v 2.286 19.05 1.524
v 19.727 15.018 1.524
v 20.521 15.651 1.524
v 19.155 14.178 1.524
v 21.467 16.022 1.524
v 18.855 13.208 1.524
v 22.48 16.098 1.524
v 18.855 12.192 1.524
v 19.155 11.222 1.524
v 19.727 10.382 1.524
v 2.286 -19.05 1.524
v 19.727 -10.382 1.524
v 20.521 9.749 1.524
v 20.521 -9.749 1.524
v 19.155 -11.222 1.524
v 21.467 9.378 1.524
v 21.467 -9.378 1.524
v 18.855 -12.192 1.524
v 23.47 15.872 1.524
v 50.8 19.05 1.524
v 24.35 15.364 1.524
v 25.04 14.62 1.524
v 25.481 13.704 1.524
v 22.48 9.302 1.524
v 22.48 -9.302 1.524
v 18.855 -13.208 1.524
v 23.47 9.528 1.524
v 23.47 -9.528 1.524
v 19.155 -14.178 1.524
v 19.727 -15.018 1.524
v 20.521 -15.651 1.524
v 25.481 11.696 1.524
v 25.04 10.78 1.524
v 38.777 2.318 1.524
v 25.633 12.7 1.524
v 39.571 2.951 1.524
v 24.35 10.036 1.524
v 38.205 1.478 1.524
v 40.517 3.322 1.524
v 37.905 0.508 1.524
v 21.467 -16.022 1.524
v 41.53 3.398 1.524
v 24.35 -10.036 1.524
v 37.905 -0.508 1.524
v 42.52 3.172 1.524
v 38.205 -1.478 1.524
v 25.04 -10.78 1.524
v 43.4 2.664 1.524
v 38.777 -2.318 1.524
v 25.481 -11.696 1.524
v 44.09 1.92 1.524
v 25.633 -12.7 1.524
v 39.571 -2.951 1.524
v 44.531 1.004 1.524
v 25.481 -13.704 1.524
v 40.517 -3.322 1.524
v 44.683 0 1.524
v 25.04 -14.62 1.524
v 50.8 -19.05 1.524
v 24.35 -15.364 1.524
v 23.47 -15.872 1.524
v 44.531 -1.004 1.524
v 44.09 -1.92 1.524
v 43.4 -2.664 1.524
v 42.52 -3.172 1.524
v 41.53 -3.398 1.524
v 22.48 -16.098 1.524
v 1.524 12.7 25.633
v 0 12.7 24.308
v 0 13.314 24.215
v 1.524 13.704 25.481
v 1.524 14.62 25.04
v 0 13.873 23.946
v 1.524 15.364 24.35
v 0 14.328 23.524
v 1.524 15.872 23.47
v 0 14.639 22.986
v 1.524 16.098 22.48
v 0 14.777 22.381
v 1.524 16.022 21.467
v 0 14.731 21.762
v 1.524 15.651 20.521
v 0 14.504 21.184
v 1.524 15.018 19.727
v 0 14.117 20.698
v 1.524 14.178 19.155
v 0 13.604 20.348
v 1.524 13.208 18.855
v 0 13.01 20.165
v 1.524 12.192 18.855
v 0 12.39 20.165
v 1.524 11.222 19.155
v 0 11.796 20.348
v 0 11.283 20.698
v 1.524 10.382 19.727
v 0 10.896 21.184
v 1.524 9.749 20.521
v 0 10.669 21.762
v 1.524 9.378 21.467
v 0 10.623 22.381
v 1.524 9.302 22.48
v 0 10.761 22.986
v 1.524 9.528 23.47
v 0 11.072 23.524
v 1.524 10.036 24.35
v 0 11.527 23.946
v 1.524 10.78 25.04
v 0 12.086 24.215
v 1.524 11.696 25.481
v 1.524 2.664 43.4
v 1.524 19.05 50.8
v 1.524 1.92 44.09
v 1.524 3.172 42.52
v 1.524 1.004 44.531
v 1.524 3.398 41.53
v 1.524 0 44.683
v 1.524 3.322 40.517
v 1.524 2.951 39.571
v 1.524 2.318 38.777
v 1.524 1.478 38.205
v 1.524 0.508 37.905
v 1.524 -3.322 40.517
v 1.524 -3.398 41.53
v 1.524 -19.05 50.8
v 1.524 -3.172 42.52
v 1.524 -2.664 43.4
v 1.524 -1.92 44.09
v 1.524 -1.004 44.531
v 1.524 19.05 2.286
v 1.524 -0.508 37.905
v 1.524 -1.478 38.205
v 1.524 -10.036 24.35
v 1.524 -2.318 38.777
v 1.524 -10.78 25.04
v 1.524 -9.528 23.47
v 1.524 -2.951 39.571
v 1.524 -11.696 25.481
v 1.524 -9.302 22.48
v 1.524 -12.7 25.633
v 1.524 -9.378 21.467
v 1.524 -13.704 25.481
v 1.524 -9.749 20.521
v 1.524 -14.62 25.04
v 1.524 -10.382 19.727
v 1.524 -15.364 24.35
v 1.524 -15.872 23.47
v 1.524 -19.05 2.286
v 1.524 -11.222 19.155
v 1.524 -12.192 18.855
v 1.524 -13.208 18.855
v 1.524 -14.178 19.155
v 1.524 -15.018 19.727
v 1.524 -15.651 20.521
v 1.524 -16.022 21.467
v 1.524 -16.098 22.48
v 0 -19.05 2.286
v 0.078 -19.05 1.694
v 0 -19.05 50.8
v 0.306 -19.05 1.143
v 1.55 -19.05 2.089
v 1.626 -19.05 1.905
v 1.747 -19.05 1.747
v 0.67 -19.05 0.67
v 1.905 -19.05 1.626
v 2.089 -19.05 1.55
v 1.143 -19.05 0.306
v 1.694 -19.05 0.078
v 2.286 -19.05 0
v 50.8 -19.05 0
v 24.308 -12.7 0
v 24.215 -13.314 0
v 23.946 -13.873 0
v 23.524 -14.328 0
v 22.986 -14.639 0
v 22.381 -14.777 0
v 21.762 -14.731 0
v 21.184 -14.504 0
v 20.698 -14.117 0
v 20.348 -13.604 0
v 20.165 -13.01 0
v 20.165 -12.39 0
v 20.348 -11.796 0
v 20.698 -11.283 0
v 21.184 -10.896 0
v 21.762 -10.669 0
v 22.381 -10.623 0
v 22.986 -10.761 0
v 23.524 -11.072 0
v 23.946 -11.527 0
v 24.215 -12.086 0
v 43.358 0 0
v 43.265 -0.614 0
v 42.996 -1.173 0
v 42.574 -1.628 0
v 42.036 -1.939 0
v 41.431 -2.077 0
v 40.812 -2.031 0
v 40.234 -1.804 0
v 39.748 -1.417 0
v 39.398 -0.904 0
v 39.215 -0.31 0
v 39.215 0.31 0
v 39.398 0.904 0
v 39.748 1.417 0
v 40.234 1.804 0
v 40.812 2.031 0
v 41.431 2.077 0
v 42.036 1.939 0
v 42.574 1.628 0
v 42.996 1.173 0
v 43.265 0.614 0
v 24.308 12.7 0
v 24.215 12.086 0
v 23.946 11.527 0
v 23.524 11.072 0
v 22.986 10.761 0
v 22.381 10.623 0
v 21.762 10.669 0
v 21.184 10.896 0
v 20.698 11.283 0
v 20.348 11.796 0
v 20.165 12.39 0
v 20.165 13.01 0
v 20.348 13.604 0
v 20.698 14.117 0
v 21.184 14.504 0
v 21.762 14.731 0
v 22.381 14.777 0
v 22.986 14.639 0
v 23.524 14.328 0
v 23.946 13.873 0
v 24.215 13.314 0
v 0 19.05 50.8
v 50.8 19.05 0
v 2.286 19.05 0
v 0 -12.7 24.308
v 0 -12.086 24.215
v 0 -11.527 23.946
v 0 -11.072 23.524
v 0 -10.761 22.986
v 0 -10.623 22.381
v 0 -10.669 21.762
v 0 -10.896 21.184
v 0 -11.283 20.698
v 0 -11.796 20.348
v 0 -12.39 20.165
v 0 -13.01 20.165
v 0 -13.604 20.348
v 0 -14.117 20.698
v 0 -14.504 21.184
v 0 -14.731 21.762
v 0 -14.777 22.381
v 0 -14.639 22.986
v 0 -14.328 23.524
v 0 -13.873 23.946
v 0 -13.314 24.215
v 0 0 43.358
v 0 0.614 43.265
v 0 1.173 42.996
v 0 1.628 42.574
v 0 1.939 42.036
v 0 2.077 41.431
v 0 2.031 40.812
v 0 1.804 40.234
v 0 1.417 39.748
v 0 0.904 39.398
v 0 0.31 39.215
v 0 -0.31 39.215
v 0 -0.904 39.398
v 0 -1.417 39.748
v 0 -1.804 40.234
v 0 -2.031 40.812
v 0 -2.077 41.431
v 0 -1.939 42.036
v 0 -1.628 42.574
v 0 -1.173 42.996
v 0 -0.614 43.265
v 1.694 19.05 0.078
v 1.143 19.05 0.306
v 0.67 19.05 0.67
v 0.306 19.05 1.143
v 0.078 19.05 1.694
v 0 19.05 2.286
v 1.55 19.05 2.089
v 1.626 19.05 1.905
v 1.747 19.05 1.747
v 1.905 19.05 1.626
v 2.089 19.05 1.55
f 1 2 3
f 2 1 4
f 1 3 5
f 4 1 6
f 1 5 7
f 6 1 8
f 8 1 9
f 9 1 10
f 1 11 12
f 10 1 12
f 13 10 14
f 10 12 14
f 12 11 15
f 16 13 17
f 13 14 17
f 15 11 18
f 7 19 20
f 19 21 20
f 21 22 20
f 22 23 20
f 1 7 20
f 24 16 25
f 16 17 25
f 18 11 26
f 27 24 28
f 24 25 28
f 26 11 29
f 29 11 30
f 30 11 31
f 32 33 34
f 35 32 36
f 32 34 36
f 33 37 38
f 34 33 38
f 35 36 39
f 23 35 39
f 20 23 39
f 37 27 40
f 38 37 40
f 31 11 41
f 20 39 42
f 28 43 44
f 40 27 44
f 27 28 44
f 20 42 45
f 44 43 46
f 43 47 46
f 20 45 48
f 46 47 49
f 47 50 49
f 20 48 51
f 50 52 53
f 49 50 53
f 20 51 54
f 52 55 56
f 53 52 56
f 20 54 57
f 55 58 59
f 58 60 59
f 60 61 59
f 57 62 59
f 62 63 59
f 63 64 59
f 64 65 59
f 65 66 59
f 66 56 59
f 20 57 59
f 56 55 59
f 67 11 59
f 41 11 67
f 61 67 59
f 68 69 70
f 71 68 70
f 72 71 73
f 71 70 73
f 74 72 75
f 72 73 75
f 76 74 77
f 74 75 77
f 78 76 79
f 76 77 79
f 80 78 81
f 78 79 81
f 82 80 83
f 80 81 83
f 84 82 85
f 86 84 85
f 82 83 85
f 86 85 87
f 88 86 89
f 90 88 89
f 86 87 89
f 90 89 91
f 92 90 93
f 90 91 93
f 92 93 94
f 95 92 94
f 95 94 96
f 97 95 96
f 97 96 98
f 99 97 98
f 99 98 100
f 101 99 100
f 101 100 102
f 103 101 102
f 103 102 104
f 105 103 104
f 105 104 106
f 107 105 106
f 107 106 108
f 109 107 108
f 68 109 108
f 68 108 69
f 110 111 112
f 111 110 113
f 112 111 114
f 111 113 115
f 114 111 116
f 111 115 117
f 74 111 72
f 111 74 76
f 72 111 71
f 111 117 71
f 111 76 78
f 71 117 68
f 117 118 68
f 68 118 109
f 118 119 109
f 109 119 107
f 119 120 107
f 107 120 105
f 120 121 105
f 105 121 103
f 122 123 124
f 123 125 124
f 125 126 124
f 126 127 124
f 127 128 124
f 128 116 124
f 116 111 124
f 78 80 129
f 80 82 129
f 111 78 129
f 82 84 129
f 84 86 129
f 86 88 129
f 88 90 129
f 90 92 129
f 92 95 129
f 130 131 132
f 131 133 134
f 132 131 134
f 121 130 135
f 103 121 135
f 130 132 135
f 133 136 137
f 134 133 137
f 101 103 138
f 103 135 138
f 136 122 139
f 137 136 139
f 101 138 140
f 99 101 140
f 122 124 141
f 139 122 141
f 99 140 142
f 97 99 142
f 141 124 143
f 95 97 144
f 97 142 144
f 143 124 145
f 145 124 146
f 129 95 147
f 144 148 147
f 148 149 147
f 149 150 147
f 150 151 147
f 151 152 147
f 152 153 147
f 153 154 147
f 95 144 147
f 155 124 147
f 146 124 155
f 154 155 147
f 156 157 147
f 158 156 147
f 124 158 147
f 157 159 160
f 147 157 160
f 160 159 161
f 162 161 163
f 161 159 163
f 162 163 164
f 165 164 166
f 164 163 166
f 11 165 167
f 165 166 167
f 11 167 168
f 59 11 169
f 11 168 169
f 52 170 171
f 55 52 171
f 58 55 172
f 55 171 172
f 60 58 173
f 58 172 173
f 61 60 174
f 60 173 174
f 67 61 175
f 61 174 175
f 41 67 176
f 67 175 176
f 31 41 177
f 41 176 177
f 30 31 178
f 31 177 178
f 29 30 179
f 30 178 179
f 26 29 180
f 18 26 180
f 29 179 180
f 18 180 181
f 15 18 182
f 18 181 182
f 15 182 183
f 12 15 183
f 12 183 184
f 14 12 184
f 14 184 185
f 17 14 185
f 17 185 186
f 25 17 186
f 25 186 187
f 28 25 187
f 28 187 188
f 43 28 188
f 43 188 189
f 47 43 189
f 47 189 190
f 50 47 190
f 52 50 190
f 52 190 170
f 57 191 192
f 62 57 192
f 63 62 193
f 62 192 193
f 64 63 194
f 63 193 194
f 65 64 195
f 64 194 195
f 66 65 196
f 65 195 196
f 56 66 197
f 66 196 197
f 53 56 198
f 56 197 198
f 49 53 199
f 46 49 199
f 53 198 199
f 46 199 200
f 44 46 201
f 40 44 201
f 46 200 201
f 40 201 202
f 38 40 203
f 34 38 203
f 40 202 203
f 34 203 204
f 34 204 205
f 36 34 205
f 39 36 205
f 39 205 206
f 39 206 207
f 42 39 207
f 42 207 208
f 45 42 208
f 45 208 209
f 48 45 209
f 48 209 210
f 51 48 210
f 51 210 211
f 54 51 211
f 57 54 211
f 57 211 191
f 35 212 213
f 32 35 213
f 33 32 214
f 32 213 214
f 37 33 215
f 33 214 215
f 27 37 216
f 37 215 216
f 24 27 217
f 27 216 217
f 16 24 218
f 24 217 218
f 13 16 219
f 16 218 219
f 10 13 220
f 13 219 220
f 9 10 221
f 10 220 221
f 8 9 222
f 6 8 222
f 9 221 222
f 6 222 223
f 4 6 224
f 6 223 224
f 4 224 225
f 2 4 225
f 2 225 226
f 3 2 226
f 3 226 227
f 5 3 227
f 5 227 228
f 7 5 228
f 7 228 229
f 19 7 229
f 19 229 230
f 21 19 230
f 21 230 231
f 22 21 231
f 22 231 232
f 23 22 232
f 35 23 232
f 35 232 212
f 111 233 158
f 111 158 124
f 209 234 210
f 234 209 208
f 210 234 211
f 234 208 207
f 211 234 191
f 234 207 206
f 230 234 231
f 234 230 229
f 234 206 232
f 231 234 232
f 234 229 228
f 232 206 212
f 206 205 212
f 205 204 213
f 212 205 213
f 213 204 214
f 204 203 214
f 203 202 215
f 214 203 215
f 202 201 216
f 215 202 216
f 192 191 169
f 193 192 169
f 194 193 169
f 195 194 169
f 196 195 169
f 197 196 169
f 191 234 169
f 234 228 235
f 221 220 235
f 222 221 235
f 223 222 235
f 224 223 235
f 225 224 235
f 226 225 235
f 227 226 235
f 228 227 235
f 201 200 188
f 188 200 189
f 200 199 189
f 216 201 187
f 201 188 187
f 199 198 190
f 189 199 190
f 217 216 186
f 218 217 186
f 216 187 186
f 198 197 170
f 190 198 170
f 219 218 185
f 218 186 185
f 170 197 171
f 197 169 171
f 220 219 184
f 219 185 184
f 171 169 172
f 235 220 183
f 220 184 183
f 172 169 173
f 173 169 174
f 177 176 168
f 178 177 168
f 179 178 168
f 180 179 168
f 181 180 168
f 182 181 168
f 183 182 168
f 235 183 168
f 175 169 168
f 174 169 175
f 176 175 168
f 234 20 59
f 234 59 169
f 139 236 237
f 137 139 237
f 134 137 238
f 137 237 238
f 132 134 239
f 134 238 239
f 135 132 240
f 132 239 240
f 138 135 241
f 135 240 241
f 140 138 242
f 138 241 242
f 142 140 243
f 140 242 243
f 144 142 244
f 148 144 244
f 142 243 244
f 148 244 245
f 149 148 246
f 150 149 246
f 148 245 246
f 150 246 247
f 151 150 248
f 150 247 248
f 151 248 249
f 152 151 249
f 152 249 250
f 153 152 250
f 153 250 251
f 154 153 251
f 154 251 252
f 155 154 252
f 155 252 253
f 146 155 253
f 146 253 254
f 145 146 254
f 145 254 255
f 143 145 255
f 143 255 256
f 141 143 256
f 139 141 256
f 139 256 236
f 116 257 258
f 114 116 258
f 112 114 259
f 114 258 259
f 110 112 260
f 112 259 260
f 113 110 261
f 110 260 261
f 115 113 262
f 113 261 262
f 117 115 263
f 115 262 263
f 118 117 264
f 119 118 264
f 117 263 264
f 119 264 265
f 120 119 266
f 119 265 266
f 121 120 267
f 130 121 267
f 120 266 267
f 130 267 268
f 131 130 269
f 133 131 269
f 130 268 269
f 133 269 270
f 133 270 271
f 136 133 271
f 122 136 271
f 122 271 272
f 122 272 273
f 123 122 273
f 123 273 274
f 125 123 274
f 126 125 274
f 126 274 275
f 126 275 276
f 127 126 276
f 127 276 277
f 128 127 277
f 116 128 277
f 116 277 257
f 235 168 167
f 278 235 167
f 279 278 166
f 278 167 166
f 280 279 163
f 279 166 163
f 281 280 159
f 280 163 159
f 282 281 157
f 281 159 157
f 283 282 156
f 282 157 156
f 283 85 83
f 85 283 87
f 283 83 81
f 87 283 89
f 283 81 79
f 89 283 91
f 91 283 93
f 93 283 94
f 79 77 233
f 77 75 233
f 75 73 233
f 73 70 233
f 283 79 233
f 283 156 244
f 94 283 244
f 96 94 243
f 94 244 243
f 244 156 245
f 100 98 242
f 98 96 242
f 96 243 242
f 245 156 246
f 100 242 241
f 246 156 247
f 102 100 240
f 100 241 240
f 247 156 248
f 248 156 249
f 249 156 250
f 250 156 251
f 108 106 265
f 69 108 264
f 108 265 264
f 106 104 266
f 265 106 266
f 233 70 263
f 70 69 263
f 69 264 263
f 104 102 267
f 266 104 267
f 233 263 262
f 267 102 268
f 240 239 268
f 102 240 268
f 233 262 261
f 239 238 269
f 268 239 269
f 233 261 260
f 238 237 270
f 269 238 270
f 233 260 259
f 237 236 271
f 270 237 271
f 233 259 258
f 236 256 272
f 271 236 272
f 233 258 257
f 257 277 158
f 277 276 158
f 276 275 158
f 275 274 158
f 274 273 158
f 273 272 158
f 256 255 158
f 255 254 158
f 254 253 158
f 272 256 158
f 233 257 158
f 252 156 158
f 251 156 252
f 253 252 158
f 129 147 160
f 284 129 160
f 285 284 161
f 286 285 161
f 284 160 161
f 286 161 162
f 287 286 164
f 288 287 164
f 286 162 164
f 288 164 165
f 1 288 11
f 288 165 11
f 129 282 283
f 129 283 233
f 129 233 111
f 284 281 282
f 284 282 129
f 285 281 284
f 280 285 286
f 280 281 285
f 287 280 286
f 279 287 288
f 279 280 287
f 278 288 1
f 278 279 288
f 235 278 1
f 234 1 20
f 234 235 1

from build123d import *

# Parameters (mm, degrees)
EXTRUDE_THIN1_START          = -19.05
EXTRUDE_THIN1_DEPTH          = 38.1
SKETCH4_R                    = 2.0828
EXTRUDE3_DEPTH               = 74.291654886
SKETCH5_R                    = 2.0828
CUT_EXTRUDE1_DEPTH           = 2.54
CUT_EXTRUDE1_DRAFT           = 41
CUT_EXTRUDE1_PROFILE_2_DEPTH = 2.54
CUT_EXTRUDE1_PROFILE_2_DRAFT = 41
CUT_EXTRUDE1_PROFILE_3_DEPTH = 2.54
CUT_EXTRUDE1_PROFILE_3_DRAFT = 41
MIRROR1_COPY_1_SKETCH_R      = 2.0828
MIRROR1_COPY_1_DEPTH         = 2.54
MIRROR1_COPY_1_DRAFT         = 41
MIRROR1_COPY_2_SKETCH_R      = 2.0828
MIRROR1_COPY_2_DEPTH         = 2.54
MIRROR1_COPY_2_DRAFT         = 41
MIRROR1_COPY_3_SKETCH_R      = 2.0828
MIRROR1_COPY_3_DEPTH         = 2.54
MIRROR1_COPY_3_DRAFT         = 41
MIRROR1_COPY_4_SKETCH_R      = 2.0828
MIRROR1_COPY_4_DEPTH         = 2.54
MIRROR1_COPY_4_DRAFT         = 41
MIRROR1_COPY_5_SKETCH_R      = 2.0828
MIRROR1_COPY_5_DEPTH         = 2.54
MIRROR1_COPY_5_DRAFT         = 41


# Read off the part's stored shape, not the designer's step: Extrude-Thin1
with BuildPart() as part:
    # Extrude-Thin1 outline → Extrude-Thin1 (new body)
    with BuildSketch(Plane(origin=(0, 0, 0), x_dir=(1, 0, 0), z_dir=(0, 1, 0)).offset(EXTRUDE_THIN1_START)):
        with BuildLine():
            Line((2.286, -1.524), (50.8, -1.524))
            Line((50.8, -1.524), (50.8, 0))
            Line((50.8, 0), (2.286, 0))
            ThreePointArc((2.286, 0), (0.669553898, -0.669553898), (0, -2.286))
            Line((0, -2.286), (0, -50.8))
            Line((0, -50.8), (1.524, -50.8))
            Line((1.524, -50.8), (1.524, -2.286))
            ThreePointArc((1.524, -2.286), (1.747184633, -1.747184633), (2.286, -1.524))
        make_face()
    extrude(amount=EXTRUDE_THIN1_DEPTH)

    # Sketch4 → Extrude3 (cut, through all)
    with BuildSketch(Plane(origin=(1.524, 0, 0), x_dir=(0, 0, -1), z_dir=(1, 0, 0))):
        with Locations((-41.275, 0)):
            Circle(SKETCH4_R)
        with Locations((-22.225, 12.7)):
            Circle(SKETCH4_R)
        with Locations((-22.225, -12.7)):
            Circle(SKETCH4_R)
    extrude3 = extrude(amount=-EXTRUDE3_DEPTH, mode=Mode.SUBTRACT)


with BuildPart() as cut_extrude1_tool:
    # Sketch5 → Cut-Extrude1 (with draft: the straight prism first)
    with BuildSketch(Plane.ZY):
        with Locations((22.225, -12.7)):
            Circle(SKETCH5_R)
    extrude(amount=-CUT_EXTRUDE1_DEPTH)
    # Cut-Extrude1: the draft: its side faces are tilted about the plane it starts from
    cut_extrude1_sides = [cut_extrude1_tool.faces().sort_by_distance(p)[0] for p in [
        (1.27, -12.7, 20.1422),
    ]]
    draft(cut_extrude1_sides, Plane.ZY, CUT_EXTRUDE1_DRAFT)


with BuildPart() as part_1:
    add(part.part)

    # Cut-Extrude1: cut by cut_extrude1_tool
    add(cut_extrude1_tool.part, mode=Mode.SUBTRACT)


with BuildPart() as cut_extrude1_profile_2_tool:
    # Sketch5 → Cut-Extrude1 profile 2 (with draft: the straight prism first)
    with BuildSketch(Plane.ZY):
        with Locations((22.225, 12.7)):
            Circle(SKETCH5_R)
    extrude(amount=-CUT_EXTRUDE1_PROFILE_2_DEPTH)
    # Cut-Extrude1 profile 2: the draft: its side faces are tilted about the plane it starts from
    cut_extrude1_profile_2_sides = [cut_extrude1_profile_2_tool.faces().sort_by_distance(p)[0] for p in [
        (1.27, 12.7, 20.1422),
    ]]
    draft(cut_extrude1_profile_2_sides, Plane.ZY, CUT_EXTRUDE1_PROFILE_2_DRAFT)


with BuildPart() as part_2:
    add(part_1.part)

    # Cut-Extrude1 profile 2: cut by cut_extrude1_profile_2_tool
    add(cut_extrude1_profile_2_tool.part, mode=Mode.SUBTRACT)


with BuildPart() as cut_extrude1_profile_3_tool:
    # Sketch5 → Cut-Extrude1 profile 3 (with draft: the straight prism first)
    with BuildSketch(Plane.ZY):
        with Locations((41.275, 0)):
            Circle(SKETCH5_R)
    extrude(amount=-CUT_EXTRUDE1_PROFILE_3_DEPTH)
    # Cut-Extrude1 profile 3: the draft: its side faces are tilted about the plane it starts from
    cut_extrude1_profile_3_sides = [cut_extrude1_profile_3_tool.faces().sort_by_distance(p)[0] for p in [
        (1.27, 0, 39.1922),
    ]]
    draft(cut_extrude1_profile_3_sides, Plane.ZY, CUT_EXTRUDE1_PROFILE_3_DRAFT)


with BuildPart() as part_3:
    add(part_2.part)

    # Cut-Extrude1 profile 3: cut by cut_extrude1_profile_3_tool
    add(cut_extrude1_profile_3_tool.part, mode=Mode.SUBTRACT)

    # Mirror1: Extrude3 across plane
    add(extrude3.mirror(Plane(origin=(0, 0, 0), x_dir=(0.7071067811865465, 0, 0.7071067811865486), z_dir=(-0.7071067811865488, 0, 0.7071067811865464))), mode=Mode.SUBTRACT)


with BuildPart() as mirror1_copy_1_tool:
    # Mirror1 copy 1 sketch → Mirror1 copy 1 (with draft: the straight prism first)
    with BuildSketch(Plane(origin=(0, 0, 0), x_dir=(1, 0, 0), z_dir=(0, 0, -1))):
        with Locations((22.225, 12.7)):
            Circle(MIRROR1_COPY_1_SKETCH_R)
    extrude(amount=-MIRROR1_COPY_1_DEPTH)
    # Mirror1 copy 1: the draft: its side faces are tilted about the plane it starts from
    mirror1_copy_1_sides = [mirror1_copy_1_tool.faces().sort_by_distance(p)[0] for p in [
        (20.1422, -12.7, 1.27),
    ]]
    draft(mirror1_copy_1_sides, Plane(origin=(0, 0, 0), x_dir=(1, 0, 0), z_dir=(0, 0, -1)), MIRROR1_COPY_1_DRAFT)


with BuildPart() as part_4:
    add(part_3.part)

    # Mirror1 copy 1: cut by mirror1_copy_1_tool
    add(mirror1_copy_1_tool.part, mode=Mode.SUBTRACT)


with BuildPart() as mirror1_copy_2_tool:
    # Mirror1 copy 2 sketch → Mirror1 copy 2 (with draft: the straight prism first)
    with BuildSketch(Plane(origin=(0, 0, 0), x_dir=(1, 0, 0), z_dir=(0, 0, -1))):
        with Locations((22.225, -12.7)):
            Circle(MIRROR1_COPY_2_SKETCH_R)
    extrude(amount=-MIRROR1_COPY_2_DEPTH)
    # Mirror1 copy 2: the draft: its side faces are tilted about the plane it starts from
    mirror1_copy_2_sides = [mirror1_copy_2_tool.faces().sort_by_distance(p)[0] for p in [
        (20.1422, 12.7, 1.27),
    ]]
    draft(mirror1_copy_2_sides, Plane(origin=(0, 0, 0), x_dir=(1, 0, 0), z_dir=(0, 0, -1)), MIRROR1_COPY_2_DRAFT)


with BuildPart() as part_5:
    add(part_4.part)

    # Mirror1 copy 2: cut by mirror1_copy_2_tool
    add(mirror1_copy_2_tool.part, mode=Mode.SUBTRACT)


with BuildPart() as mirror1_copy_3_tool:
    # Mirror1 copy 3 sketch → Mirror1 copy 3 (with draft: the straight prism first)
    with BuildSketch(Plane(origin=(0, 0, 0), x_dir=(1, 0, 0), z_dir=(0, 0, -1))):
        with Locations((41.275, 0)):
            Circle(MIRROR1_COPY_3_SKETCH_R)
    extrude(amount=-MIRROR1_COPY_3_DEPTH)
    # Mirror1 copy 3: the draft: its side faces are tilted about the plane it starts from
    mirror1_copy_3_sides = [mirror1_copy_3_tool.faces().sort_by_distance(p)[0] for p in [
        (39.1922, 0, 1.27),
    ]]
    draft(mirror1_copy_3_sides, Plane(origin=(0, 0, 0), x_dir=(1, 0, 0), z_dir=(0, 0, -1)), MIRROR1_COPY_3_DRAFT)


with BuildPart() as part_6:
    add(part_5.part)

    # Mirror1 copy 3: cut by mirror1_copy_3_tool
    add(mirror1_copy_3_tool.part, mode=Mode.SUBTRACT)


with BuildPart() as mirror1_copy_4_tool:
    # Mirror1 copy 4 sketch → Mirror1 copy 4 (with draft: the straight prism first)
    with BuildSketch(Plane(origin=(0, 0, 0), x_dir=(1, 0, 0), z_dir=(0, 0, -1))):
        with Locations((22.225, -12.7)):
            Circle(MIRROR1_COPY_4_SKETCH_R)
    extrude(amount=-MIRROR1_COPY_4_DEPTH)
    # Mirror1 copy 4: the draft: its side faces are tilted about the plane it starts from
    mirror1_copy_4_sides = [mirror1_copy_4_tool.faces().sort_by_distance(p)[0] for p in [
        (20.1422, 12.7, 1.27),
    ]]
    draft(mirror1_copy_4_sides, Plane(origin=(0, 0, 0), x_dir=(1, 0, 0), z_dir=(0, 0, -1)), MIRROR1_COPY_4_DRAFT)


with BuildPart() as part_7:
    add(part_6.part)

    # Mirror1 copy 4: cut by mirror1_copy_4_tool
    add(mirror1_copy_4_tool.part, mode=Mode.SUBTRACT)


with BuildPart() as mirror1_copy_5_tool:
    # Mirror1 copy 5 sketch → Mirror1 copy 5 (with draft: the straight prism first)
    with BuildSketch(Plane(origin=(0, 0, 0), x_dir=(1, 0, 0), z_dir=(0, 0, -1))):
        with Locations((41.275, 0)):
            Circle(MIRROR1_COPY_5_SKETCH_R)
    extrude(amount=-MIRROR1_COPY_5_DEPTH)
    # Mirror1 copy 5: the draft: its side faces are tilted about the plane it starts from
    mirror1_copy_5_sides = [mirror1_copy_5_tool.faces().sort_by_distance(p)[0] for p in [
        (39.1922, 0, 1.27),
    ]]
    draft(mirror1_copy_5_sides, Plane(origin=(0, 0, 0), x_dir=(1, 0, 0), z_dir=(0, 0, -1)), MIRROR1_COPY_5_DRAFT)


with BuildPart() as part_8:
    add(part_7.part)

    # Mirror1 copy 5: cut by mirror1_copy_5_tool
    add(mirror1_copy_5_tool.part, mode=Mode.SUBTRACT)


solid = part_8.part
